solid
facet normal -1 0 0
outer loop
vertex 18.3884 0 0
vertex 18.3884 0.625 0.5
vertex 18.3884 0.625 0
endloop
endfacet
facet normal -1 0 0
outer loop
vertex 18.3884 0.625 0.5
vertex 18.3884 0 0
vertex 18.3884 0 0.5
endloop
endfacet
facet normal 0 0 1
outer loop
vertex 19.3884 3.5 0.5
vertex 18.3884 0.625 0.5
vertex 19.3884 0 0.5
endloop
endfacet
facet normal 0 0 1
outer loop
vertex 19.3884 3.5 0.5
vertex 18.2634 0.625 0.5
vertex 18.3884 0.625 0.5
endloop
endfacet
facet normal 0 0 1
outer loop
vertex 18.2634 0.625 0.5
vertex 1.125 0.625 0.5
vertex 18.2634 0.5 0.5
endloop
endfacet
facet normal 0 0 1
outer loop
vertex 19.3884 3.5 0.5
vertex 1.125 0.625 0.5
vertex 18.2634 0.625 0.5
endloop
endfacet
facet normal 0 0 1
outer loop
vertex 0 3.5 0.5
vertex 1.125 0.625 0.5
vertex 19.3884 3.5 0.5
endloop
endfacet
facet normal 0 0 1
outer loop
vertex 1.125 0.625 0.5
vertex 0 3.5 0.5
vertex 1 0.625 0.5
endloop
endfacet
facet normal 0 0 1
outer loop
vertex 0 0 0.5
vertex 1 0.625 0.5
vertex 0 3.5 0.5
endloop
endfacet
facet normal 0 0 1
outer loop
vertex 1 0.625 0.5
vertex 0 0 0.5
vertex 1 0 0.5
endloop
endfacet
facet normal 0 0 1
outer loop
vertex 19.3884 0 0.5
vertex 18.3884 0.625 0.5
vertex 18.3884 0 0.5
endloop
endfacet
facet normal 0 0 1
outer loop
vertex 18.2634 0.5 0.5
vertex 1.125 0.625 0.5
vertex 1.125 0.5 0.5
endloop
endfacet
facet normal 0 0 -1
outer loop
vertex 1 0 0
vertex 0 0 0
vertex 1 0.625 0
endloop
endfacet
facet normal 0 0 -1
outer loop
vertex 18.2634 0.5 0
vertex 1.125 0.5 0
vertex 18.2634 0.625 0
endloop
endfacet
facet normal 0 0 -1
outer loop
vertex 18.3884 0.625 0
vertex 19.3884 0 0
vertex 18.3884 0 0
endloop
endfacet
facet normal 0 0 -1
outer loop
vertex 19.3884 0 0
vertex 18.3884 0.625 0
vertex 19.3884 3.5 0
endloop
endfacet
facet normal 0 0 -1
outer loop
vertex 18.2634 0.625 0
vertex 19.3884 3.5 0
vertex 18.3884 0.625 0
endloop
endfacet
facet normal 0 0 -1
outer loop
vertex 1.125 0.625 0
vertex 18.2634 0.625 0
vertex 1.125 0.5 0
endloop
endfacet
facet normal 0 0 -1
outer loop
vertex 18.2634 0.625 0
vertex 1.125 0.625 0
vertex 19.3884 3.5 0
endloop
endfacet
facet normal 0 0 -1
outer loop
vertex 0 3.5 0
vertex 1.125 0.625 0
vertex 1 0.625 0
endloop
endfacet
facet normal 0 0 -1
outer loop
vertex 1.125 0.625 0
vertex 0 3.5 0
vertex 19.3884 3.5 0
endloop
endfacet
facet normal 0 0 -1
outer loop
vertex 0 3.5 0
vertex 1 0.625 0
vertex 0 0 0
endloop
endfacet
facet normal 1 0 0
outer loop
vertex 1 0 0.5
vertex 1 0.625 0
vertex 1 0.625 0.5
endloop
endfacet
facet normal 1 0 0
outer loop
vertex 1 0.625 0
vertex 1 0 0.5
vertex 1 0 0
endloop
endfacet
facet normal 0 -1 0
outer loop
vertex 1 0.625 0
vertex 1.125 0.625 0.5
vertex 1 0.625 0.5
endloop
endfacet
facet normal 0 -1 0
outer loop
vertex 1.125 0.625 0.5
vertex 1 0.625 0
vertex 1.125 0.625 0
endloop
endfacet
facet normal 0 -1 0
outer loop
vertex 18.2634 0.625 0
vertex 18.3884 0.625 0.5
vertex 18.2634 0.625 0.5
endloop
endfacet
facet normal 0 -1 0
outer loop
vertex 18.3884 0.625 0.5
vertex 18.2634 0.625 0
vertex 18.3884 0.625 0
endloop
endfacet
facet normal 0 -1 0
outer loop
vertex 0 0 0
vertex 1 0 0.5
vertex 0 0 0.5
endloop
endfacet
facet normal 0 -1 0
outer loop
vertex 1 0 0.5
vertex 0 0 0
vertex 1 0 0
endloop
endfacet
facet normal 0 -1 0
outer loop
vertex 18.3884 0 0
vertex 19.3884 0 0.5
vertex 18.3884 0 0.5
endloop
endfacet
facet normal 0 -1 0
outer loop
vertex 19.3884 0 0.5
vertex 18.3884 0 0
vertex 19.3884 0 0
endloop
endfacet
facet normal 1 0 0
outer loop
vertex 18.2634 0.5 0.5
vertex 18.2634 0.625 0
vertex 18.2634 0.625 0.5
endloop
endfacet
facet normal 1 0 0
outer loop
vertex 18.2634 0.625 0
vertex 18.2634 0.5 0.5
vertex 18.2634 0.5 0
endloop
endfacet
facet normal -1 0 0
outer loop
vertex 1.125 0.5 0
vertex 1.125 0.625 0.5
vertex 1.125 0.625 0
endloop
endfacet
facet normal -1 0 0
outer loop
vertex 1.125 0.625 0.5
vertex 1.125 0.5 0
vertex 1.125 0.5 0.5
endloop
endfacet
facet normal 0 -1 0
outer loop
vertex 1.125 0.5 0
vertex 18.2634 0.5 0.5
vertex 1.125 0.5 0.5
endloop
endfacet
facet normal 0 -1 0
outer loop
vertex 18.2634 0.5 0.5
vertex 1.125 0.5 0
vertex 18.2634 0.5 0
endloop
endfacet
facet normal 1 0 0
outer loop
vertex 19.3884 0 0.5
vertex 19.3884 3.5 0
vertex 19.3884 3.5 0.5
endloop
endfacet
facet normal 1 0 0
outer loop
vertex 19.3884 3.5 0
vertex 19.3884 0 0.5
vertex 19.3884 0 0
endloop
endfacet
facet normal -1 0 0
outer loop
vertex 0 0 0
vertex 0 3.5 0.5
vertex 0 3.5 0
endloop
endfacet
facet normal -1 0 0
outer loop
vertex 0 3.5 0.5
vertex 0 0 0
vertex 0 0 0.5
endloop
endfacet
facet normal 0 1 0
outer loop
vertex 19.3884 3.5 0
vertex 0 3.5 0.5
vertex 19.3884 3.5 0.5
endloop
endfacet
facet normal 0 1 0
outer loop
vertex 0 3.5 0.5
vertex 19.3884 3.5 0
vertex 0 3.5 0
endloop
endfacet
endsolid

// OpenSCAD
// file: modus.scad
//Corner Joint - allows the sides of two parts to create inlayed corner. Aids with welding.
//need to verify module math is the same throughout all parts.

module cornerjoint(Z,L,H,EndGap,PadL,PadH,CJangle,CJcenter){
    //change so that H = Z of inlayed part (usually 0.5)
    //add center and angle in degrees option, orgin far side of cut out area

     if((CJangle==0)&&(CJcenter==0))
      {    
        translate([0,0,0])
        rotate([0,0,CJangle])
        difference(){
        cube([L,H+PadH,Z]);
        translate([EndGap,H,0])
        cube([PadL,PadH,Z]);
        translate([L-EndGap-PadL,H,0])
        cube([PadL,PadH,Z]);}
      }    
else if((CJangle==90)&&(CJcenter==0))
      {    
        translate([H+PadH,0,0])
        rotate([0,0,CJangle])
        difference(){
        cube([L,H+PadH,Z]);
        translate([EndGap,H,0])
        cube([PadL,PadH,Z]);
        translate([L-EndGap-PadL,H,0])
        cube([PadL,PadH,Z]);}
      }
else if((CJangle==180)&&(CJcenter==0))       
      {    
        translate([L,H+PadH,0])
        rotate([0,0,CJangle])
        difference(){
        cube([L,H+PadH,Z]);
        translate([EndGap,H,0])
        cube([PadL,PadH,Z]);
        translate([L-EndGap-PadL,H,0])
        cube([PadL,PadH,Z]);}
      }
else if((CJangle==270)&&(CJcenter==0))
      {    
        translate([0,L,0])
        rotate([0,0,CJangle])
        difference(){
        cube([L,H+PadH,Z]);
        translate([EndGap,H,0])
        cube([PadL,PadH,Z]);
        translate([L-EndGap-PadL,H,0])
        cube([PadL,PadH,Z]);}
      }  
      
//centered     
   
else if((CJangle==0)&&(CJcenter==1))
      {    
        translate([-L/2,0,0])
        rotate([0,0,CJangle])
        difference(){
        cube([L,H+PadH,Z]);
        translate([EndGap,H,0])
        cube([PadL,PadH,Z]);
        translate([L-EndGap-PadL,H,0])
        cube([PadL,PadH,Z]);}
      }  
else if((CJangle==90)&&(CJcenter==1))
      {    
        translate([0,-L/2,0])
        rotate([0,0,CJangle])
        difference(){
        cube([L,H+PadH,Z]);
        translate([EndGap,H,0])
        cube([PadL,PadH,Z]);
        translate([L-EndGap-PadL,H,0])
        cube([PadL,PadH,Z]);}
      }
else if((CJangle==180)&&(CJcenter==1))       
      {    
        translate([L/2,0,0])
        rotate([0,0,CJangle])
        difference(){
        cube([L,H+PadH,Z]);
        translate([EndGap,H,0])
        cube([PadL,PadH,Z]);
        translate([L-EndGap-PadL,H,0])
        cube([PadL,PadH,Z]);}
      }
else if((CJangle==270)&&(CJcenter==1))
      {    
        translate([0,L/2,0])
        rotate([0,0,CJangle])
        difference(){
        cube([L,H+PadH,Z]);
        translate([EndGap,H,0])
        cube([PadL,PadH,Z]);
        translate([L-EndGap-PadL,H,0])
        cube([PadL,PadH,Z]);}
      }
} //end cornerjoint module

//Tab Insert - used to cut a hole for an abutting part to insert into. Typically aids with welding the two parts.
module tabinsert(X,Y,Z,dGap,cGap,c1,c2,c3,c4,c5,c6,c7,c8,center){
    translate([-dGap-(center*(X/2)),-dGap-(center*(Y/2)),0]){
        //main cut
        cube([X+(dGap*2),Y+(dGap*2),Z]);
        //corner c1c2
        translate([-cGap,(Y+(dGap*2))-c1+cGap,0])
            {
        cube([c2,c1,Z]);}
       //corner c3c4
       translate([(X+(dGap*2))-c3+cGap,(Y+(dGap*2))-c4+cGap,0]){
           cube([c3,c4,Z]);
       }
       //corner c5c6
       translate([(X+(dGap*2))-c6+cGap,-cGap,0])
      {
          cube([c6,c5,Z]);
      }
       
       //corner c7c8 
       translate([-cGap,-cGap,0]){
           cube([c7,c8,Z]);
       }
    
    } //end center translate
} //end tabinsert module
 
// file: vars.scad
brickW=6; 
brickL=12;
brickCH=6;

$fn=8; //defines resolution of circles. 8 is okay for review. 100  or greater should be used for for final dxf export.

dZstandard=0.5; //thickness of steel to be cut for drawer parts
fZstandard=0.5;
aZstandard=0.5; //thickness of steel to be cut for arm parts

fBOLTHOLEstandardD=1; //standard bolts used on frame
sliderodholeOD=1.2; 

dGap=0.03125; //gap between a hole cut's edge and the part sitting within the hole. //D3 appears to use 0.3125, is this in error?

//all parts set to standard thickness below
//off standard preferences can be defined below

//drawer
drawergap=0.0283;  //extra room for drawer to slide in the space between f1 and f4
drawerHgap=0.1884;  //total extra space from drawer sides to frame walls. sum of both sides.

d1z=dZstandard;
d2z=dZstandard;
d3z=dZstandard;
d4z=dZstandard;
d5z=dZstandard;
d6z=dZstandard;
d5z=dZstandard;
d7z=dZstandard;
d8z=dZstandard;
d9z=dZstandard;

//frame
f1x=24.2;
f1y=6;
f1z=0.5;


f2y=3.5;
f2z=fZstandard;

f3x=f1x;
f3y=3.5;
f3z=fZstandard;

f4y=11;
f4z=fZstandard;

f5y=3.5;
f5z=fZstandard;

f6y=8;
f6z=fZstandard;

f8y=brickW;
f8z=fZstandard;
f8boltD=1;

f9y=4.5;
f9x=43.5;  //set based on MAINcylinder
f9z=fZstandard;

f8x=f9x;

f11x=1.25;
f11z=fZstandard;

f13z=fZstandard;

//arms

a1x=4;
a1y=72; //calculate based on drawer cylinder
a1z=aZstandard;

a2x=6;
a2y=72;  //calculate based on drawer cylinder
a2z=aZstandard;

a4z=aZstandard;
a6z=aZstandard;

//
//Input your main cylinder's dimenions here
//
cylinderMAINminC2E=0; //main hydraulic cylinder's distance from center of mounting hole to the end of the shaft when fully compressed.
cylinderMAINmaxC2E=0; //main hydraulic cylinder's distance from center of mounting hole to the end of the shaft when fully extended.

//
//Input your drawer cylinder's dimenions here
//
cylinderDRAWERbodyH=3; //measured when in position, largest length from top to bottom of cylinder
cylinderDRAWERminC2C=0; //drawer's hydraulic cylinder's distance from the center of one mounting hole to the center of the other when fully compressed.
cylinderDRAWERmaxC2C=0; ///drawer's hydraulic cylinder's distance from the center of one mounting hole to the center of the other when fully extended.
cylinderDRAWERrodclevisW=2.5; //width of cylinders' clevis on end of rod
cylinderDRAWERrodclevisID=1;
cylinderDRAWERrodclevisOD=2;
cylinderDRAWERrearclevisW=2.5; //width of mounting clevis cylinder body
cylinderDRAWERrearclevisID=1;
cylinderDRAWERrearclevisOD=2;
cylinderDRAWERrearclevisClearance=3; //usable space around rear clevis pin (in diameter). be aware of hyraulic fittings.

//the following variables are calculated in order of dependence on preceding variables
d3x=brickL+(d2z*2);
d3y=brickCH-d1z;
d4x=brickW+d3z+d3z;
d4y=brickCH-d1z;
d5x=brickL+(d2z*2);
d5y=brickW;
d6x=brickL+(d2z*2);
d6y=brickCH;
d7x=cylinderDRAWERrearclevisClearance;
d7y=a4z+d8z+cylinderDRAWERbodyH;
d9x=cylinderDRAWERbodyH+d6z;
d9y=cylinderDRAWERbodyH+d8z;
d8x=brickL+(d2z*2);
d8y=max(5,(d9x-d6z));   //need to review fundamentals, 5 minimun unless d9 gets larger than d8
d1x=18.5;   //need to come up with a formula
d1y=18;     //need to come up with a formula
d2x=d8y+d6z+brickW+d3z+d5y+d3z;
d2y=brickCH;

f11y=f8y;
f6x=brickL+(d2z*2)+(f9y*2)+drawerHgap;
f8x=43.5;  //need to define based on MAINcylinder inputs


f2x=brickL+(d2z*2)+drawerHgap+(f9y*2)-(1.4*2);  //distance between large cut outs in f9

f5x=brickL+(d2z*2)+drawerHgap+(f9y*2)+(a1x*2); //distance between outer edges of each A1

f4x=f5x-0.5;   //same as f5 but minus 0.25 on each side to give a little overhang
// main file
include <vars.scad>;
use <modus.scad>;

f2p();

module f2p(){
    
difference(){
    cube([f2x,f2y,f2z]);
    translate([1,0,0])
        cornerjoint(f2z,f2x-2,f1z,0.125,f2x-2-0.25,0.125,0,0);
} //end difference

} //end f2p module
